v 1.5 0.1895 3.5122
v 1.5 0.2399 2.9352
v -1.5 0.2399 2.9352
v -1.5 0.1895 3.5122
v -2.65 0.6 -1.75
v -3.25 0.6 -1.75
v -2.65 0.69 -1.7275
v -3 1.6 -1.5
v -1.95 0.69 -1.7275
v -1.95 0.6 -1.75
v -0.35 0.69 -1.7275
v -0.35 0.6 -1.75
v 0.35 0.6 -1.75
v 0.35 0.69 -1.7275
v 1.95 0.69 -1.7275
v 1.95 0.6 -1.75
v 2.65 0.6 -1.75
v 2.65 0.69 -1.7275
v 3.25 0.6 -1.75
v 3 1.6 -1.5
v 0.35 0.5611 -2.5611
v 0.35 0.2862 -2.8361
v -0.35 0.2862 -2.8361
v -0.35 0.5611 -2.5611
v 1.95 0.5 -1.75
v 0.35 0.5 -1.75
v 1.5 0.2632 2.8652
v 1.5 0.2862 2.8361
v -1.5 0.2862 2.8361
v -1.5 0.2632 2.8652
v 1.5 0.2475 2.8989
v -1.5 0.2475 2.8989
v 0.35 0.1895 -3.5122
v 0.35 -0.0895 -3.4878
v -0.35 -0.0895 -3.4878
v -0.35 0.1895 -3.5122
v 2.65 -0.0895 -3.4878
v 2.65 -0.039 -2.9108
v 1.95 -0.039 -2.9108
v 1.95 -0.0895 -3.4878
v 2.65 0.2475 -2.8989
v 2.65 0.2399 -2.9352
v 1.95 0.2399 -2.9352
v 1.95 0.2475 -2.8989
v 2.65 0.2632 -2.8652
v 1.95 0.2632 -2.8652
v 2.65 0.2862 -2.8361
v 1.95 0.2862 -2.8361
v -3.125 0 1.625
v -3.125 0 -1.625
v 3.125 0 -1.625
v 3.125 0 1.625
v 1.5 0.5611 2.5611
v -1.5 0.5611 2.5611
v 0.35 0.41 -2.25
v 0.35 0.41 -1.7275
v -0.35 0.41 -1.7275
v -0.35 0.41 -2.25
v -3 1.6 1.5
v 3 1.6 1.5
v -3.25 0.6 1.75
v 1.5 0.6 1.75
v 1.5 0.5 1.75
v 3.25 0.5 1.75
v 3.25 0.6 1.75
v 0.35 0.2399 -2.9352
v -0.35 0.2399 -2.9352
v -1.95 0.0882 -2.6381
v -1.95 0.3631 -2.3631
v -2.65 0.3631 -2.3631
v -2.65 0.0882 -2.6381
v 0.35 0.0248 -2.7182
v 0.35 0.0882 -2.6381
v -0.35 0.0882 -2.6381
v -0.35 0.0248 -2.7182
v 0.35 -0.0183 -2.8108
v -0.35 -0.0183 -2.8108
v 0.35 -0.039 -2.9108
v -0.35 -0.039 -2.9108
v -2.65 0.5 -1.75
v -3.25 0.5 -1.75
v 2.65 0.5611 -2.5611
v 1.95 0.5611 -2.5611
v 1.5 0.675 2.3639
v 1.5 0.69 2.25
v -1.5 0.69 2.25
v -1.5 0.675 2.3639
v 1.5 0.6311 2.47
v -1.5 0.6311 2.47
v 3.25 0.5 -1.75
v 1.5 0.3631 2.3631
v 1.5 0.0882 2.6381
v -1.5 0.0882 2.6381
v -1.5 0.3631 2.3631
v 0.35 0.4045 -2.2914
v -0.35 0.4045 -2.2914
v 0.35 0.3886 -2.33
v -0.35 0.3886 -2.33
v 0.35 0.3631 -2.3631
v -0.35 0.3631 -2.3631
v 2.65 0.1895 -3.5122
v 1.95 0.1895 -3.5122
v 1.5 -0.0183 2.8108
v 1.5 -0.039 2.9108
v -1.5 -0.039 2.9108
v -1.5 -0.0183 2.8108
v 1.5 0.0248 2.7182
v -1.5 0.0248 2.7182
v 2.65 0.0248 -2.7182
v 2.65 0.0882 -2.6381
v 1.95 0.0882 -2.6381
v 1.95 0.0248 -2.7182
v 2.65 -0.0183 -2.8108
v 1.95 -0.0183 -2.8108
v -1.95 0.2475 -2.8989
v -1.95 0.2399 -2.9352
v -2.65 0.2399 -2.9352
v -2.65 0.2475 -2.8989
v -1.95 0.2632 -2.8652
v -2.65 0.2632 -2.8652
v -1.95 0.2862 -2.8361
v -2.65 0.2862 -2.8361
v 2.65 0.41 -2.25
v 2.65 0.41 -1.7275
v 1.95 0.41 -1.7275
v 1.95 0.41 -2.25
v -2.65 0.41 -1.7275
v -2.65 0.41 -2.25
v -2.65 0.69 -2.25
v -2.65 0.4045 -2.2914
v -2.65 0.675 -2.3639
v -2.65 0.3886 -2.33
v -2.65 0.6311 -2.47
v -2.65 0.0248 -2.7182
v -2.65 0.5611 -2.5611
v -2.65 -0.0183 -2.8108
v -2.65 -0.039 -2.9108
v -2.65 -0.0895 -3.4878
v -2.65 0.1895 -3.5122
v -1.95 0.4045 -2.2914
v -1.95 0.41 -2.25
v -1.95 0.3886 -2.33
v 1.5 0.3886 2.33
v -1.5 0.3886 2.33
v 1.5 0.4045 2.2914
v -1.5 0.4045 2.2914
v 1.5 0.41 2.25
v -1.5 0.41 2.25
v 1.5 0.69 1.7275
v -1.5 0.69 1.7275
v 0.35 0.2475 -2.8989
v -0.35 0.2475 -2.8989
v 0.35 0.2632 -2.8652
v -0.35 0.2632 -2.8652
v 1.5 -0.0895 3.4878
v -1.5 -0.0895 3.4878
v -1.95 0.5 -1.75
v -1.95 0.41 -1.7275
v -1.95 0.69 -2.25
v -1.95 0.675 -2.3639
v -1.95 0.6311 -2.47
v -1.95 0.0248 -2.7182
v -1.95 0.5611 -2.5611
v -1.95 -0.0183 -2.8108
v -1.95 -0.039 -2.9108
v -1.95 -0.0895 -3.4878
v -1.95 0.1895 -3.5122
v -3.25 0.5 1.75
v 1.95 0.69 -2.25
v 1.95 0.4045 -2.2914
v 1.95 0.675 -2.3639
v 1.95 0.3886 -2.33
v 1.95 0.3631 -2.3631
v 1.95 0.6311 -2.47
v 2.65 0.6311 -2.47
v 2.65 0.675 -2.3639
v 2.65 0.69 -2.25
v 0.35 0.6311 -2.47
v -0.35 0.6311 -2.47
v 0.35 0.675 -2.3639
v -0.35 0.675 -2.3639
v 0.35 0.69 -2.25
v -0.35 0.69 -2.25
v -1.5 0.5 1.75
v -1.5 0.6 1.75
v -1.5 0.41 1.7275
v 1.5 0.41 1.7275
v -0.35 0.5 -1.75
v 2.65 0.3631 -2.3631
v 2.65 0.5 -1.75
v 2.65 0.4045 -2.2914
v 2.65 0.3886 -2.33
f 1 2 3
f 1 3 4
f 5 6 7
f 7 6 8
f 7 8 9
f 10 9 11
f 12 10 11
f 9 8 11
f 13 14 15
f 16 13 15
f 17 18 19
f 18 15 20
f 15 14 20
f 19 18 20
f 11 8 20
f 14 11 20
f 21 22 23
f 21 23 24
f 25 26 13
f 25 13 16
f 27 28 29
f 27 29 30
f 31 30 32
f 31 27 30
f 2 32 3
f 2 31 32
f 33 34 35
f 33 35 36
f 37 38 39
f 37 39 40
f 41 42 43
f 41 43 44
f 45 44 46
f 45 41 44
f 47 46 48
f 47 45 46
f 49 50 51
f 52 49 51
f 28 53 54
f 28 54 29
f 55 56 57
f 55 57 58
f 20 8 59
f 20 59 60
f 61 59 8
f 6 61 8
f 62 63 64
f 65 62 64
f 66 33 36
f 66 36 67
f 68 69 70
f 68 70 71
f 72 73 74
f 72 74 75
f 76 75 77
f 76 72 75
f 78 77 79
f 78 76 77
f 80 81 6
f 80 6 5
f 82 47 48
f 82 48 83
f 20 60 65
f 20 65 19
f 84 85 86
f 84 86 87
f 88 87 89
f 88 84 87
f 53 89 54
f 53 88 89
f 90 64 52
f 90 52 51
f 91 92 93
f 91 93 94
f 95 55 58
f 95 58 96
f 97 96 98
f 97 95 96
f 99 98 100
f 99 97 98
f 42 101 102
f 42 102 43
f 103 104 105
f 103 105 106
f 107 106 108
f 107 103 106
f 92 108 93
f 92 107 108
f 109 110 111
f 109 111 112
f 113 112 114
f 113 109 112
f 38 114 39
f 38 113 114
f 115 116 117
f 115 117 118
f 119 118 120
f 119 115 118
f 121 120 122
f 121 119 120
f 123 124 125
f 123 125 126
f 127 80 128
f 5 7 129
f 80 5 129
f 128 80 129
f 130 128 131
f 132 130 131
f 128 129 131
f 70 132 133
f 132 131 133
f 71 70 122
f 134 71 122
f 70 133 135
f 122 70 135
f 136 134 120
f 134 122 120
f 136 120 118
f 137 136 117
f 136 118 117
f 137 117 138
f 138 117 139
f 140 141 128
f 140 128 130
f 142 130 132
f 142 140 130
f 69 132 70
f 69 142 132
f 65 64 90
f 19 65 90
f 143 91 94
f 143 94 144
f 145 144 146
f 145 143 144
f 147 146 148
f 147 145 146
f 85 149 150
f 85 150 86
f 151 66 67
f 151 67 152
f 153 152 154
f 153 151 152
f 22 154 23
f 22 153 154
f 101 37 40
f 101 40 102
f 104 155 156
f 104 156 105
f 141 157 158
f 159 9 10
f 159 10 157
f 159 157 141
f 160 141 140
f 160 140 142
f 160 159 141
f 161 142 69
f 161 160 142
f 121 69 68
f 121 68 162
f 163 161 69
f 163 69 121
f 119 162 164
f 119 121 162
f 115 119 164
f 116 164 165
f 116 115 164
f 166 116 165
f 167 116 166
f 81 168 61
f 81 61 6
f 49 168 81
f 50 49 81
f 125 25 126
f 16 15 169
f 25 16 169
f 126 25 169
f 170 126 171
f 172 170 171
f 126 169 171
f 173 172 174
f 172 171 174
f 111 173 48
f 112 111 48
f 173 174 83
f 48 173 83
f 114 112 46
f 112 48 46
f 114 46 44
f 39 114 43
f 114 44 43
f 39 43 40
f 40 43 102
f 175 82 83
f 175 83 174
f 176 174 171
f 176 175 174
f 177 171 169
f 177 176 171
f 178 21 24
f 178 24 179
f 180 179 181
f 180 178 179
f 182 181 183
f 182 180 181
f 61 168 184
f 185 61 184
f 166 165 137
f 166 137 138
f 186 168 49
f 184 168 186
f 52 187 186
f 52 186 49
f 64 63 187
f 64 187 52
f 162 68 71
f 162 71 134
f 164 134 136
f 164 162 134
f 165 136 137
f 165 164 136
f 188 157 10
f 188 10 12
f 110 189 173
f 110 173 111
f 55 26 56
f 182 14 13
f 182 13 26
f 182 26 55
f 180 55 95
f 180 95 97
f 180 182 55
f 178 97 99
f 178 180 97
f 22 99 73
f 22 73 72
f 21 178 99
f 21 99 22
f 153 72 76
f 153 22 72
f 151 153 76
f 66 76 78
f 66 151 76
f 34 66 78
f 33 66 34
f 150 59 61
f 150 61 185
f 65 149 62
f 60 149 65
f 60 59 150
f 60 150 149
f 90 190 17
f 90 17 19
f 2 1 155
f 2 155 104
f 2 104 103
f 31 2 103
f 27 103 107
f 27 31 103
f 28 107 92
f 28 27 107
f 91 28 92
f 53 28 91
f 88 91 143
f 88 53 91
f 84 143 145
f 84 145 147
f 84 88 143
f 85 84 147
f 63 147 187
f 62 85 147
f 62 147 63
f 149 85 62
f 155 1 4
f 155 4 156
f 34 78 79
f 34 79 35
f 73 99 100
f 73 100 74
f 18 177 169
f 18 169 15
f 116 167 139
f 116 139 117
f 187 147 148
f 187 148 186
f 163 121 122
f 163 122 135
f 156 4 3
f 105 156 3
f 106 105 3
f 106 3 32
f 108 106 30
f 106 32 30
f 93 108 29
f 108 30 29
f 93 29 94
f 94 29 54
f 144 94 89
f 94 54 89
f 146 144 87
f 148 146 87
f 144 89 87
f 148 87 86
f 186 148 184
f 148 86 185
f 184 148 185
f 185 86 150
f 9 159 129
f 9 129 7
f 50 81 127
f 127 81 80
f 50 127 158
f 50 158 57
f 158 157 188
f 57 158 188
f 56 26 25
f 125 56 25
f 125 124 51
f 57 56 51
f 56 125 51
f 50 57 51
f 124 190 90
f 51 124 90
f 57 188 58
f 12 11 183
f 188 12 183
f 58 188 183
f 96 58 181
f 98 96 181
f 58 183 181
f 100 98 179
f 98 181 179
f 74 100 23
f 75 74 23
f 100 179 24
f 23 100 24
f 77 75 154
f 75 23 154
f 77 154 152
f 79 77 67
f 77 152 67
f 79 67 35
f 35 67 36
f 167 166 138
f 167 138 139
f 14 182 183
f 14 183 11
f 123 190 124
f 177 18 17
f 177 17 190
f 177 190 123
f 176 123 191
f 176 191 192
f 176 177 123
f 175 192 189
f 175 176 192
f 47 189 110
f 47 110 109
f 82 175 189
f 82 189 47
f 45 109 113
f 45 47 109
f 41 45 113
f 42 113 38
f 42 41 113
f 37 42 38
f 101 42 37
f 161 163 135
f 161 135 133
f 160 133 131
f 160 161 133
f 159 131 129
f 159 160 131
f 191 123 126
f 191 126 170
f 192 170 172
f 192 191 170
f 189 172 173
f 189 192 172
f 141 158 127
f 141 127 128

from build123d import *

# Parameters (mm, degrees)
SKETCH1_W             = 6.5
SKETCH1_H             = 3.5
BOSS_EXTRUDE1_DEPTH   = 1.6
CHAMFER1_SIZE         = 1
CHAMFER1_SIZE2        = 0.25
CHAMFER1_PART_2_SIZE  = 1
CHAMFER1_PART_2_SIZE2 = 0.25
CHAMFER1_PART_3_SIZE  = 1
CHAMFER1_PART_3_SIZE2 = 0.25
CHAMFER1_PART_4_SIZE  = 1
CHAMFER1_PART_4_SIZE2 = 0.25
CHAMFER2_SIZE         = 0.125
CHAMFER2_SIZE2        = 0.5
EXTRUDE_THIN1_DEPTH   = 1.5
EXTRUDE_THIN2_DEPTH   = 0.35
LPATTERN1_COUNT       = 3
LPATTERN1_PITCH       = 2.3


with BuildPart() as part:
    # Sketch1 → Boss-Extrude1 (new body)
    with BuildSketch(Plane(origin=(0, 0, 0), x_dir=(1, 0, 0), z_dir=(0, 1, 0))):
        Rectangle(SKETCH1_W, SKETCH1_H)
    extrude(amount=BOSS_EXTRUDE1_DEPTH)

    # Chamfer1
    chamfer1_edges = [part.edges().sort_by_distance(p)[0] for p in [
        (3.25, 1.6, 0),
    ]]
    chamfer1_side = [part.faces().sort_by_distance(p)[0] for p in [
        (3.25, 0.8, 0),
    ]]
    chamfer(chamfer1_edges, length=CHAMFER1_SIZE, length2=CHAMFER1_SIZE2, reference=chamfer1_side[0])

    # Chamfer1 part 2
    chamfer1_part_2_edges = [part.edges().sort_by_distance(p)[0] for p in [
        (0, 1.6, -1.75),
    ]]
    chamfer1_part_2_side = [part.faces().sort_by_distance(p)[0] for p in [
        (0, 0.8, -1.75),
    ]]
    chamfer(chamfer1_part_2_edges, length=CHAMFER1_PART_2_SIZE, length2=CHAMFER1_PART_2_SIZE2, reference=chamfer1_part_2_side[0])

    # Chamfer1 part 3
    chamfer1_part_3_edges = [part.edges().sort_by_distance(p)[0] for p in [
        (-3.25, 1.6, 0),
    ]]
    chamfer1_part_3_side = [part.faces().sort_by_distance(p)[0] for p in [
        (-3.25, 0.8, 0),
    ]]
    chamfer(chamfer1_part_3_edges, length=CHAMFER1_PART_3_SIZE, length2=CHAMFER1_PART_3_SIZE2, reference=chamfer1_part_3_side[0])

    # Chamfer1 part 4
    chamfer1_part_4_edges = [part.edges().sort_by_distance(p)[0] for p in [
        (0, 1.6, 1.75),
    ]]
    chamfer1_part_4_side = [part.faces().sort_by_distance(p)[0] for p in [
        (0, 0.8, 1.75),
    ]]
    chamfer(chamfer1_part_4_edges, length=CHAMFER1_PART_4_SIZE, length2=CHAMFER1_PART_4_SIZE2, reference=chamfer1_part_4_side[0])

    # Chamfer2
    chamfer2_edges = [part.edges().sort_by_distance(p)[0] for p in [
        (0, 0, -1.75),
        (3.25, 0, 0),
        (0, 0, 1.75),
        (-3.25, 0, 0),
    ]]
    chamfer2_side = [part.faces().sort_by_distance(p)[0] for p in [
        (0, 0, 0),
    ]]
    chamfer(chamfer2_edges, length=CHAMFER2_SIZE, length2=CHAMFER2_SIZE2, reference=chamfer2_side[0])

    # Sketch2 → Extrude-Thin1 (add, symmetric)
    with BuildSketch(Plane(origin=(0, 0, 0), x_dir=(0, 0, -1), z_dir=(1, 0, 0))):
        with BuildLine():
            Line((0, 0.69), (-2.25, 0.69))
            ThreePointArc((-2.25, 0.69), (-2.41838071, 0.656506994), (-2.561126984, 0.561126984))
            Line((-2.561126984, 0.561126984), (-2.836055715, 0.286198252))
            ThreePointArc((-2.836055715, 0.286198252), (-2.881573879, 0.254326091), (-2.935247882, 0.239944185))
            Line((-2.935247882, 0.239944185), (-3.512201804, 0.189467258))
            Line((-3.512201804, 0.189467258), (-3.487798196, -0.089467258))
            Line((-3.487798196, -0.089467258), (-2.910844274, -0.03899033))
            ThreePointArc((-2.910844274, -0.03899033), (-2.763240765, 0.000559911), (-2.638065817, 0.088208353))
            Line((-2.638065817, 0.088208353), (-2.363137085, 0.363137085))
            ThreePointArc((-2.363137085, 0.363137085), (-2.311229349, 0.397820725), (-2.25, 0.41))
            Line((-2.25, 0.41), (0, 0.41))
            Line((0, 0.41), (0, 0.69))
        make_face()
    extrude(amount=EXTRUDE_THIN1_DEPTH, both=True)

    # Sketch3 → Extrude-Thin2 (add, symmetric)
    with BuildSketch(Plane(origin=(2.3, 0, 0), x_dir=(0, 0, -1), z_dir=(1, 0, 0))):
        with BuildLine():
            Line((0, 0.41), (2.25, 0.41))
            ThreePointArc((2.25, 0.41), (2.311229349, 0.397820725), (2.363137085, 0.363137085))
            Line((2.363137085, 0.363137085), (2.638065817, 0.088208353))
            ThreePointArc((2.638065817, 0.088208353), (2.763240765, 0.000559911), (2.910844274, -0.03899033))
            Line((2.910844274, -0.03899033), (3.487798196, -0.089467258))
            Line((3.487798196, -0.089467258), (3.512201804, 0.189467258))
            Line((3.512201804, 0.189467258), (2.935247882, 0.239944185))
            ThreePointArc((2.935247882, 0.239944185), (2.881573879, 0.254326091), (2.836055715, 0.286198252))
            Line((2.836055715, 0.286198252), (2.561126984, 0.561126984))
            ThreePointArc((2.561126984, 0.561126984), (2.41838071, 0.656506994), (2.25, 0.69))
            Line((2.25, 0.69), (0, 0.69))
            Line((0, 0.69), (0, 0.41))
        make_face()
    extrude_thin2 = extrude(amount=EXTRUDE_THIN2_DEPTH, both=True)

    # LPattern1: Extrude-Thin2 ×3
    with Locations(*[(-i * LPATTERN1_PITCH, 0, 0) for i in range(1, LPATTERN1_COUNT)]):
        add(extrude_thin2)


solid = part.part
